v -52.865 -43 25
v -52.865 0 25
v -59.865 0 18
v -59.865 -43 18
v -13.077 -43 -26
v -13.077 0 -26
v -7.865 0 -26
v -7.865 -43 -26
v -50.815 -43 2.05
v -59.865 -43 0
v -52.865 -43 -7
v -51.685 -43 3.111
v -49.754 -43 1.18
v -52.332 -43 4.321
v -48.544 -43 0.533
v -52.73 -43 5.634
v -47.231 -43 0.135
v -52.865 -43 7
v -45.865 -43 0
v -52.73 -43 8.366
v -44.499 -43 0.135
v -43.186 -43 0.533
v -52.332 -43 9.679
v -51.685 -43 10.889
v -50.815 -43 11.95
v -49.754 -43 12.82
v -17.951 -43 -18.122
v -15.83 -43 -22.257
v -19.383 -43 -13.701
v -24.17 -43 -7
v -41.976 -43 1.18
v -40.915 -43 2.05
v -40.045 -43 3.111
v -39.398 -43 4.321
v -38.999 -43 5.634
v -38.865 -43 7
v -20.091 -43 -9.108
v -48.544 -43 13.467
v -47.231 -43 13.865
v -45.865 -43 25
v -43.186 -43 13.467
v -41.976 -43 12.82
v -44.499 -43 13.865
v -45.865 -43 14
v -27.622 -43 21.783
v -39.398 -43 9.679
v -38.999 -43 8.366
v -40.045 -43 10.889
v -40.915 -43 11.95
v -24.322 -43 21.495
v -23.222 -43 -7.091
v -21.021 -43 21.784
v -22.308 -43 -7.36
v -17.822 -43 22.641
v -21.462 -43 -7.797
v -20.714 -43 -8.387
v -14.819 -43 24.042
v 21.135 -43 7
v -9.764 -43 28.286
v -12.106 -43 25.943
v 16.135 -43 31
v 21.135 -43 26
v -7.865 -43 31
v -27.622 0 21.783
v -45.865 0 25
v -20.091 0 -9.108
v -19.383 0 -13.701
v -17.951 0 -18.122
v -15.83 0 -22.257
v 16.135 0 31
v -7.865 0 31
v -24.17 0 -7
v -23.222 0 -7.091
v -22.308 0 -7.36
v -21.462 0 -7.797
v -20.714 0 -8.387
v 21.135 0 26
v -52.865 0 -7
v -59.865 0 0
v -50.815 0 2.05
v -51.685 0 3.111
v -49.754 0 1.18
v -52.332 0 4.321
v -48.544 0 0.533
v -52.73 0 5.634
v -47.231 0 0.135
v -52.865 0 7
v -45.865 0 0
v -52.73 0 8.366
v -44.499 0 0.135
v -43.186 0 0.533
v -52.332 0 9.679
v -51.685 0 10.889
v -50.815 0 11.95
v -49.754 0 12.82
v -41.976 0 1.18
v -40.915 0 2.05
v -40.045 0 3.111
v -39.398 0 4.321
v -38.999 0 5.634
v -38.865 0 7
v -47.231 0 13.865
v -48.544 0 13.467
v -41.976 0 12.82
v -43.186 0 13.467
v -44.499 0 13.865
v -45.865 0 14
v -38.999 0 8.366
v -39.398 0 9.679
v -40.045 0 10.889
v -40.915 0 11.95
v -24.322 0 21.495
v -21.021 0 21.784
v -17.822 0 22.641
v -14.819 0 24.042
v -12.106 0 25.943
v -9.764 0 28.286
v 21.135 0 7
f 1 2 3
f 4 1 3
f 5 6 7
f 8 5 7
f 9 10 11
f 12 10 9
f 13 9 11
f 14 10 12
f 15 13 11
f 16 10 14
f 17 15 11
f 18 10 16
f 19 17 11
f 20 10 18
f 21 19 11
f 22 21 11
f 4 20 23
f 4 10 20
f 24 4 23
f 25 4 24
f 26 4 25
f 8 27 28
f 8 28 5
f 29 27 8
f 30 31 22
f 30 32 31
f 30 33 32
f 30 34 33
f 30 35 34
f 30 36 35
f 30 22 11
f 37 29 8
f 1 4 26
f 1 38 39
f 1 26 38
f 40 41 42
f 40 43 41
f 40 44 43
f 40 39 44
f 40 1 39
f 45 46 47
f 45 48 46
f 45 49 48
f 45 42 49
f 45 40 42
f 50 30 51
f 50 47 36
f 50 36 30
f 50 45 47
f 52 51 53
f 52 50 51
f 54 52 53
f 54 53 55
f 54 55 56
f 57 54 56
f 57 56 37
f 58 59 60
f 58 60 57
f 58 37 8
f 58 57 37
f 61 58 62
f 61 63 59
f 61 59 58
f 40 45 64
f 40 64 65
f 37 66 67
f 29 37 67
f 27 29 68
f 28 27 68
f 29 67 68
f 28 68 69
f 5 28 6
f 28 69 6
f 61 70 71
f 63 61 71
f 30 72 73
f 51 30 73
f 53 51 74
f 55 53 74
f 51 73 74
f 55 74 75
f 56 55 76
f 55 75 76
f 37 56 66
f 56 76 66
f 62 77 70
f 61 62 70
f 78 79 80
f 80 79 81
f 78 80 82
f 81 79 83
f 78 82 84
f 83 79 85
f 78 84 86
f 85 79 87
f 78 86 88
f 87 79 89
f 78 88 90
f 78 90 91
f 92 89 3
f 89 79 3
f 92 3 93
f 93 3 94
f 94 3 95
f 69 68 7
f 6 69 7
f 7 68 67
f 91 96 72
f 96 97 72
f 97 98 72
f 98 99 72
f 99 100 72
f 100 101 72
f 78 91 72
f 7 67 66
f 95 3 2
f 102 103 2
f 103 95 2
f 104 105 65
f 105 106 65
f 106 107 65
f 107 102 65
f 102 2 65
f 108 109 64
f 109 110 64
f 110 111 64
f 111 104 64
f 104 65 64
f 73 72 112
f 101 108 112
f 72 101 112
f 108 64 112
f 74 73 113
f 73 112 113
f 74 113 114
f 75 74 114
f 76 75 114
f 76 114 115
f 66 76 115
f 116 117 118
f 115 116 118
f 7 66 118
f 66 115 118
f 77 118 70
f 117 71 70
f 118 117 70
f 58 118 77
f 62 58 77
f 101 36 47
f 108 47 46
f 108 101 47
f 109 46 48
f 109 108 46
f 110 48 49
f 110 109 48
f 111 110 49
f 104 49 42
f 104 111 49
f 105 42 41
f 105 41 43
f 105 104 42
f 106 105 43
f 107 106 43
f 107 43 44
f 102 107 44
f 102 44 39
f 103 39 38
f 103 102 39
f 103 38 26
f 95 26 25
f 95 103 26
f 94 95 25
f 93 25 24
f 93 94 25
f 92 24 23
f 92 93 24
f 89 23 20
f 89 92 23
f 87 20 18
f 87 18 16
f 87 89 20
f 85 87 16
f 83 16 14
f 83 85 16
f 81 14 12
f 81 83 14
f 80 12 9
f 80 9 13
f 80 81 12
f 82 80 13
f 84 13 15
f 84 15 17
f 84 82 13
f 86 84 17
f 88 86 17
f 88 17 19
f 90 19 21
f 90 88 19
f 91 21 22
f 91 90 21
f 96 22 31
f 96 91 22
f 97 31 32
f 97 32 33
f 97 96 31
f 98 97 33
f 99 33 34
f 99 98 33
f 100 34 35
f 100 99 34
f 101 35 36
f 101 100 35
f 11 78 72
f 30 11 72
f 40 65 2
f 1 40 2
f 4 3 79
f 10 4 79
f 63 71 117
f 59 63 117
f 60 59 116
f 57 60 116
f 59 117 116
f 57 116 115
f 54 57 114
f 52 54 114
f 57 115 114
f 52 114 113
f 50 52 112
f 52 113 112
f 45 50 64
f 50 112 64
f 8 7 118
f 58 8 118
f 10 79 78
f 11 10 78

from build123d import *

# Parameters (mm, degrees)
F0_R     = 7
F1_DEPTH = 43


with BuildPart() as f1:
    # F0 (on Front) → F1 (new body)
    with BuildSketch(Plane.XZ):
        with BuildLine():
            ThreePointArc((-20.091246, -9.108256), (-17.950626, -18.121598), (-13.076884, -26))
            Line((-13.076884, -26), (-7.864951, -26))
            Line((-7.864951, -26), (21.135049, 7))
            Line((21.135049, 7), (21.135049, 26))
            Line((21.135049, 26), (16.135049, 31))
            Line((16.135049, 31), (-7.864951, 31))
            ThreePointArc((-7.864951, 31), (-16.289978, 23.276069), (-27.621866, 21.783252))
            Line((-27.621866, 21.783252), (-45.864951, 25))
            Line((-45.864951, 25), (-52.864951, 25))
            Line((-52.864951, 25), (-59.864951, 18))
            Line((-59.864951, 18), (-59.864951, 0))
            Line((-59.864951, 0), (-52.864951, -7))
            Line((-52.864951, -7), (-24.170194, -7))
            ThreePointArc((-24.170194, -7), (-21.874407, -7.558226), (-20.091246, -9.108256))
        make_face()
        with Locations((-45.864951, 7)):
            Circle(F0_R, mode=Mode.SUBTRACT)
    extrude(amount=F1_DEPTH)


solid = f1.part
